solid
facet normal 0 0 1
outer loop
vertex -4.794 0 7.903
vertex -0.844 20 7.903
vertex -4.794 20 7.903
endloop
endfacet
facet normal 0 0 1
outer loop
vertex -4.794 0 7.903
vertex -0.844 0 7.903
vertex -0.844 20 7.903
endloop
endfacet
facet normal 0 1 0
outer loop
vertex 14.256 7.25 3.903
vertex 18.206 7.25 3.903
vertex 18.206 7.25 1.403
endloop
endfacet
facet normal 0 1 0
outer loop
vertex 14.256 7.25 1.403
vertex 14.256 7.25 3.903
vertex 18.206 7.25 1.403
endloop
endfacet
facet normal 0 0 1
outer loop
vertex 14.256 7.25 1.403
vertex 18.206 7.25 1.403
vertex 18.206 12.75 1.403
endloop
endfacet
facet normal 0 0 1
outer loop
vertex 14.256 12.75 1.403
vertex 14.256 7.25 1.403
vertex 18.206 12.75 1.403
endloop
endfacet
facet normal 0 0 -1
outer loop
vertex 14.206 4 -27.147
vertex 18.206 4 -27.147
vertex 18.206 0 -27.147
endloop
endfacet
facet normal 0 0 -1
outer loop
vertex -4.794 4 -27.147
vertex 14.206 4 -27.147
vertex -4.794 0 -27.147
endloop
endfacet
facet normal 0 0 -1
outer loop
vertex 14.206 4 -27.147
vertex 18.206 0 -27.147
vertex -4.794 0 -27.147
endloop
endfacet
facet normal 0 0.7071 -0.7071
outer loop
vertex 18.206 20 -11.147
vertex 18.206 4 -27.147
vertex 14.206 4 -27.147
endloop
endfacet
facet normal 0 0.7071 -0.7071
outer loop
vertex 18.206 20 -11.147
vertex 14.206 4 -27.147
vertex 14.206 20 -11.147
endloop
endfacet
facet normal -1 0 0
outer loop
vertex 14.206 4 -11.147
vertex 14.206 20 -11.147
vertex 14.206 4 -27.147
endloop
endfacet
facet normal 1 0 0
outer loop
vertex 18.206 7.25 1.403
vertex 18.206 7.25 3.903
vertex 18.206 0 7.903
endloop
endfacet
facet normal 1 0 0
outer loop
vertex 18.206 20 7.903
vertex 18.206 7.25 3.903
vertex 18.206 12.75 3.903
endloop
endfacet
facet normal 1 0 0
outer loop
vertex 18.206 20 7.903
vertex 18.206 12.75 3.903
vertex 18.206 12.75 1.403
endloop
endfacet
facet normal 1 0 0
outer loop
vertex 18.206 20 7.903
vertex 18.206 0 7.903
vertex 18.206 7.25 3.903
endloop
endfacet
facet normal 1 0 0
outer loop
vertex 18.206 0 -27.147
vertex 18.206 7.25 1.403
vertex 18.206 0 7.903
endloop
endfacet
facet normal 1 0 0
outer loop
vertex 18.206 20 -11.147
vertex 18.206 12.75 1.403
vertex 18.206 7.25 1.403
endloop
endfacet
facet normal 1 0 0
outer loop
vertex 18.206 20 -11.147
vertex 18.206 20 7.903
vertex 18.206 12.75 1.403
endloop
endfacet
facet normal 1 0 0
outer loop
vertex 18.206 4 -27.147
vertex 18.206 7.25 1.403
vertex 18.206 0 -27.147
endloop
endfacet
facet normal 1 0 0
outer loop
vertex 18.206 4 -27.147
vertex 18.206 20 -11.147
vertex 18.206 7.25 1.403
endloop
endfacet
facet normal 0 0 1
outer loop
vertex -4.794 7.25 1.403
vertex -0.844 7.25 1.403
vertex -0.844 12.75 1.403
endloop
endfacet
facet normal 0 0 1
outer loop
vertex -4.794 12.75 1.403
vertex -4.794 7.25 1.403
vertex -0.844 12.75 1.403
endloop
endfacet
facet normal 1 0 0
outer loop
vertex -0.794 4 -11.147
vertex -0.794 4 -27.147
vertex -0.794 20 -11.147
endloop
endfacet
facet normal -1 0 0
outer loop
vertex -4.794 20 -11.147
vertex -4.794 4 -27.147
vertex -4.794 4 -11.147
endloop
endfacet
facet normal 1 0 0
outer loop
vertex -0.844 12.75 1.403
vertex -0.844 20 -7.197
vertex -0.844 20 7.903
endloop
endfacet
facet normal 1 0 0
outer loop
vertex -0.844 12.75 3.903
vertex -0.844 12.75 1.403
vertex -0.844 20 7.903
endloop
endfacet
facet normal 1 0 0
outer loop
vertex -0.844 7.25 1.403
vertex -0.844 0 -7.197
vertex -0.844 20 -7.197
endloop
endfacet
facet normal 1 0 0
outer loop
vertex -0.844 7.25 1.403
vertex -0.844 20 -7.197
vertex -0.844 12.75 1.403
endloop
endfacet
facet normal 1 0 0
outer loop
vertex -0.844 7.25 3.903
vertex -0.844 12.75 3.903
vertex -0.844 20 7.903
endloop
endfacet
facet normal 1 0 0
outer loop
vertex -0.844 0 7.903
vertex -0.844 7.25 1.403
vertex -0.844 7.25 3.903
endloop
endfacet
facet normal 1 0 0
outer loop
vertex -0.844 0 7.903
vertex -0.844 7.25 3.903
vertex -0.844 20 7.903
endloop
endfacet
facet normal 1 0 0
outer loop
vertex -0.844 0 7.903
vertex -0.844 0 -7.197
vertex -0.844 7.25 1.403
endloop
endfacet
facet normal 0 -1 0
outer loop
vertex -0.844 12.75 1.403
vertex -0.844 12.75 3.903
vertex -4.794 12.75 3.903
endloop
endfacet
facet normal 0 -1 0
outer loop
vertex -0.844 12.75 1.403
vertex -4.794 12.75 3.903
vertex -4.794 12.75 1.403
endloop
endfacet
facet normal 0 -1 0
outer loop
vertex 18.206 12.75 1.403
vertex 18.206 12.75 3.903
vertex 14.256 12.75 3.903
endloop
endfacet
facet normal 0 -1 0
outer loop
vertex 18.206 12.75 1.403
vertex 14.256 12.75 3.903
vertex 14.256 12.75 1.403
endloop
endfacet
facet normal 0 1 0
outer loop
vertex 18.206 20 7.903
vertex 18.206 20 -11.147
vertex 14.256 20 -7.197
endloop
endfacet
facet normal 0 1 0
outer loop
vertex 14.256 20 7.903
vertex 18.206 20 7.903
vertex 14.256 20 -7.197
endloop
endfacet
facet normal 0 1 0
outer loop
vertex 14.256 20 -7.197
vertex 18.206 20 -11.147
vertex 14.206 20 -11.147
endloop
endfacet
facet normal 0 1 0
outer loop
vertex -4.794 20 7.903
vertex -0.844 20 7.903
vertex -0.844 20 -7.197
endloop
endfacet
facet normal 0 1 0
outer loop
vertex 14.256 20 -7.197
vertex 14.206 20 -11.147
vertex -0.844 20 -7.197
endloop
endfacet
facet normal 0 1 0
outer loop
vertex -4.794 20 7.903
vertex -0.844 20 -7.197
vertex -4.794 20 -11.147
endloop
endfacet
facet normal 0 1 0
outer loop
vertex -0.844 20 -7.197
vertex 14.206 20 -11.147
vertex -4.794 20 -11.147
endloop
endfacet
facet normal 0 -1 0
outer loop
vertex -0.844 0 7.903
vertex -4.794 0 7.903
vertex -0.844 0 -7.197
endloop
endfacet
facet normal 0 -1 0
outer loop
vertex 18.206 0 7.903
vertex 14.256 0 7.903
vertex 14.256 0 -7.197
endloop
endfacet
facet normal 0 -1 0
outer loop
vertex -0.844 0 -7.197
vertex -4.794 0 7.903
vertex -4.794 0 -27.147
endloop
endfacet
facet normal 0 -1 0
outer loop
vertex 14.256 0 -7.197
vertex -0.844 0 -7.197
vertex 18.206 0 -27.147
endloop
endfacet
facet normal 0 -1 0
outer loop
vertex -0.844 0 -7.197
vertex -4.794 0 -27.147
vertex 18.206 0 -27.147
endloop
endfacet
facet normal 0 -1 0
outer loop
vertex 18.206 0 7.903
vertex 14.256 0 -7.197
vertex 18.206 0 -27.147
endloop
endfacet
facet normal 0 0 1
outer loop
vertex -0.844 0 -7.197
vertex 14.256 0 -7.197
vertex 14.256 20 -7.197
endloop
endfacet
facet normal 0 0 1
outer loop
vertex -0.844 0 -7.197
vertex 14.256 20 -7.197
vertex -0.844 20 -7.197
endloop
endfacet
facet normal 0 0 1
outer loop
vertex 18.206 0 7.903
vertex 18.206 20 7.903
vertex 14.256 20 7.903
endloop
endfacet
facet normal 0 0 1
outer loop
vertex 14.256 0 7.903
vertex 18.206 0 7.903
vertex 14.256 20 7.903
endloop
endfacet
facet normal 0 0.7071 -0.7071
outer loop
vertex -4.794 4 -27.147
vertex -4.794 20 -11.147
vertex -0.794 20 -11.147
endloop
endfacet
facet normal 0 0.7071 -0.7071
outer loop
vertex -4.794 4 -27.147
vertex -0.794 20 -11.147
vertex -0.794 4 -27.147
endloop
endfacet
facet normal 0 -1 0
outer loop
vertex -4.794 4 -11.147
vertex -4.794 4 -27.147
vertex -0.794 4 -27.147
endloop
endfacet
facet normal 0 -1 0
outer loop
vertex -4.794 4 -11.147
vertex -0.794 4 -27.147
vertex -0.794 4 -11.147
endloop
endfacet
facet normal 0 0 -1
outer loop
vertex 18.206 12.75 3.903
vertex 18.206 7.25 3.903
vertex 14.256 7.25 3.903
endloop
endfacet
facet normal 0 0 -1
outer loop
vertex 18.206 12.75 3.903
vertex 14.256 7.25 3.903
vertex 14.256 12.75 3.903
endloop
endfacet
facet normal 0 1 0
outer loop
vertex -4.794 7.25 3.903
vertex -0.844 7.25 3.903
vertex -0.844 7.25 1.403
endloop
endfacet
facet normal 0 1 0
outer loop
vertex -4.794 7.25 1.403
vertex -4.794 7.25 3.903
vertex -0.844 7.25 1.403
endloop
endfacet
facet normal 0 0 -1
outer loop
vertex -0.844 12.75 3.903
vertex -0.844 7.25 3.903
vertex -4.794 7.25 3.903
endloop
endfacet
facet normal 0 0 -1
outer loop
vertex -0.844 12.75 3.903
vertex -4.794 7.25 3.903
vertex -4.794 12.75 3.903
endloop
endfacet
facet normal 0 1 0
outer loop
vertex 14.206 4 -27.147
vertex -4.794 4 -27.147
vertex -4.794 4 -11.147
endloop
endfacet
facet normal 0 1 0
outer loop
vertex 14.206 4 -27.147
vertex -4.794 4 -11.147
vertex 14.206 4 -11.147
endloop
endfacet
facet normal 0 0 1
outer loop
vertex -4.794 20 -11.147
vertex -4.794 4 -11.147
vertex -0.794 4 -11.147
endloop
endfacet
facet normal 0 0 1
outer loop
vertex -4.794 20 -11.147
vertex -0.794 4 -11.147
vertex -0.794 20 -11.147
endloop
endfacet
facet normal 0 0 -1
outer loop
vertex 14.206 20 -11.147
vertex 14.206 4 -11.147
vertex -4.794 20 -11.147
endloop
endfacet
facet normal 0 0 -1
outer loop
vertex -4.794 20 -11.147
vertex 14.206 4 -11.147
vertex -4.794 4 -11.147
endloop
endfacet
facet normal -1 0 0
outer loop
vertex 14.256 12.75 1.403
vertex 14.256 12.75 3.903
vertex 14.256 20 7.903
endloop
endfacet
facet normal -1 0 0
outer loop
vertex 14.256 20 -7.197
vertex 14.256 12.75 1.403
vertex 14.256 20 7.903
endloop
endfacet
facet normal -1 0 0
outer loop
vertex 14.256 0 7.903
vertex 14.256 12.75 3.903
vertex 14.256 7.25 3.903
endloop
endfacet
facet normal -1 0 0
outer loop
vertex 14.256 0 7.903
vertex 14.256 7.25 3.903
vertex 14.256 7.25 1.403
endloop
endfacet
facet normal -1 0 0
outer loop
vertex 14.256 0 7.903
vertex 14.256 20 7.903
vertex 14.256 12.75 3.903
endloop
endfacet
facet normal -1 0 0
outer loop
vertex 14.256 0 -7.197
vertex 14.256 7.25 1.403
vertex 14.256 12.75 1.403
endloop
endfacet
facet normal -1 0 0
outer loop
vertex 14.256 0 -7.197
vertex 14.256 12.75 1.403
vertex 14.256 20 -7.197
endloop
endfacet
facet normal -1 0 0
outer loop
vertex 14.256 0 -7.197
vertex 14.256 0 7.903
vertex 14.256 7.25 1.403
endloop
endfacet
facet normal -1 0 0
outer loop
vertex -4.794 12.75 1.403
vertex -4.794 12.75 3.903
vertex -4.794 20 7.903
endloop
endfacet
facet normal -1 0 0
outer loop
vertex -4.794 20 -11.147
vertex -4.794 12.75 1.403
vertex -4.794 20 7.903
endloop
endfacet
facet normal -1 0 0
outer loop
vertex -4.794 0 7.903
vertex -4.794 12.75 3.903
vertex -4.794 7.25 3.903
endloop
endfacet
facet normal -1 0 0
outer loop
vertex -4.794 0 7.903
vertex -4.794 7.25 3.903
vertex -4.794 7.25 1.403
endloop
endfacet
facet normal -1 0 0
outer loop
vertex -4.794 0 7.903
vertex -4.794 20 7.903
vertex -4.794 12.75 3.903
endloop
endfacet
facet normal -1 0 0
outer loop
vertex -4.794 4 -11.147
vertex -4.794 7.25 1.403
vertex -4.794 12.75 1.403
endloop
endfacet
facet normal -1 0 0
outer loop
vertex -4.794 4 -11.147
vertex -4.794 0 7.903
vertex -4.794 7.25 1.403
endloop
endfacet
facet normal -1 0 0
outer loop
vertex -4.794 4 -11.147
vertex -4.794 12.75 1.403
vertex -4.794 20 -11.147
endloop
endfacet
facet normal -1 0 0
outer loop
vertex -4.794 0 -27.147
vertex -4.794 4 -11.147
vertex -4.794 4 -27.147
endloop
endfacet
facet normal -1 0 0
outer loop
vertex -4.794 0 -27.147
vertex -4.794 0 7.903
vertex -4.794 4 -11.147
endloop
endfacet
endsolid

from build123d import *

# Parameters (mm, degrees)
EXTRUDE_1_DEPTH     = 4
EXTRUDE_2_DEPTH     = 16
EXTRUDE_3_DEPTH     = 4
EXTRUDE_4_DEPTH     = 4
SKETCH_5_W          = 2.5
SKETCH_5_H          = 5.5
CUT_EXTRUDE_1_DEPTH = 32


with BuildPart() as part:
    # 草图1 → 凸台-拉伸1 (new body)
    with BuildSketch(Plane(origin=(0, 0, 0), x_dir=(1, 0, 0), z_dir=(0, 1, 0))):
        Polygon((-4.794036697, 11.146788991), (-4.794036697, -7.903211009), (-0.844036697, -7.903211009), (-0.844036697, 7.196788991), (14.255963303, 7.196788991), (14.255963303, -7.903211009), (18.205963303, -7.903211009), (18.205963303, 11.146788991), (18.205963303, 27.146788991), (-4.794036697, 27.146788991), align=None)
    extrude(amount=EXTRUDE_1_DEPTH)

    # 草图2 → 凸台-拉伸2 (add)
    with BuildSketch(Plane(origin=(0, 4, 0), x_dir=(1, 0, 0), z_dir=(0, 1, 0))):
        Polygon((-4.794036697, 11.146788991), (-0.844036697, 11.146788991), (14.255963303, 11.146788991), (18.205963303, 11.146788991), (18.205963303, -7.903211009), (14.255963303, -7.903211009), (14.255963303, 7.196788991), (-0.844036697, 7.196788991), (-0.844036697, -7.903211009), (-4.794036697, -7.903211009), align=None)
    extrude(amount=EXTRUDE_2_DEPTH)

    # 草图4 → 凸台-拉伸4 (add)
    with BuildSketch(Plane(origin=(18.205963303, 0, 0), x_dir=(0, 0, -1), z_dir=(1, 0, 0))):
        Polygon((11.146788991, 20), (11.146788991, 4), (27.146788991, 4), align=None)
    extrude(amount=-EXTRUDE_4_DEPTH)

    # 草图5 → 切除-拉伸1 (cut)
    with BuildSketch(Plane(origin=(18.205963303, 0, 0), x_dir=(0, 0, -1), z_dir=(1, 0, 0))):
        with Locations((-2.653211009, 10)):
            Rectangle(SKETCH_5_W, SKETCH_5_H)
    extrude(amount=-CUT_EXTRUDE_1_DEPTH, mode=Mode.SUBTRACT)


with BuildPart() as body_2:
    # 草图3 → 凸台-拉伸3 (new body)
    with BuildSketch(Plane.ZY.offset(4.794036697)):
        Polygon((-11.146788991, 20), (-27.146788991, 4), (-11.146788991, 4), align=None)
    extrude(amount=-EXTRUDE_3_DEPTH)


solid = Compound([part.part, body_2.part])
